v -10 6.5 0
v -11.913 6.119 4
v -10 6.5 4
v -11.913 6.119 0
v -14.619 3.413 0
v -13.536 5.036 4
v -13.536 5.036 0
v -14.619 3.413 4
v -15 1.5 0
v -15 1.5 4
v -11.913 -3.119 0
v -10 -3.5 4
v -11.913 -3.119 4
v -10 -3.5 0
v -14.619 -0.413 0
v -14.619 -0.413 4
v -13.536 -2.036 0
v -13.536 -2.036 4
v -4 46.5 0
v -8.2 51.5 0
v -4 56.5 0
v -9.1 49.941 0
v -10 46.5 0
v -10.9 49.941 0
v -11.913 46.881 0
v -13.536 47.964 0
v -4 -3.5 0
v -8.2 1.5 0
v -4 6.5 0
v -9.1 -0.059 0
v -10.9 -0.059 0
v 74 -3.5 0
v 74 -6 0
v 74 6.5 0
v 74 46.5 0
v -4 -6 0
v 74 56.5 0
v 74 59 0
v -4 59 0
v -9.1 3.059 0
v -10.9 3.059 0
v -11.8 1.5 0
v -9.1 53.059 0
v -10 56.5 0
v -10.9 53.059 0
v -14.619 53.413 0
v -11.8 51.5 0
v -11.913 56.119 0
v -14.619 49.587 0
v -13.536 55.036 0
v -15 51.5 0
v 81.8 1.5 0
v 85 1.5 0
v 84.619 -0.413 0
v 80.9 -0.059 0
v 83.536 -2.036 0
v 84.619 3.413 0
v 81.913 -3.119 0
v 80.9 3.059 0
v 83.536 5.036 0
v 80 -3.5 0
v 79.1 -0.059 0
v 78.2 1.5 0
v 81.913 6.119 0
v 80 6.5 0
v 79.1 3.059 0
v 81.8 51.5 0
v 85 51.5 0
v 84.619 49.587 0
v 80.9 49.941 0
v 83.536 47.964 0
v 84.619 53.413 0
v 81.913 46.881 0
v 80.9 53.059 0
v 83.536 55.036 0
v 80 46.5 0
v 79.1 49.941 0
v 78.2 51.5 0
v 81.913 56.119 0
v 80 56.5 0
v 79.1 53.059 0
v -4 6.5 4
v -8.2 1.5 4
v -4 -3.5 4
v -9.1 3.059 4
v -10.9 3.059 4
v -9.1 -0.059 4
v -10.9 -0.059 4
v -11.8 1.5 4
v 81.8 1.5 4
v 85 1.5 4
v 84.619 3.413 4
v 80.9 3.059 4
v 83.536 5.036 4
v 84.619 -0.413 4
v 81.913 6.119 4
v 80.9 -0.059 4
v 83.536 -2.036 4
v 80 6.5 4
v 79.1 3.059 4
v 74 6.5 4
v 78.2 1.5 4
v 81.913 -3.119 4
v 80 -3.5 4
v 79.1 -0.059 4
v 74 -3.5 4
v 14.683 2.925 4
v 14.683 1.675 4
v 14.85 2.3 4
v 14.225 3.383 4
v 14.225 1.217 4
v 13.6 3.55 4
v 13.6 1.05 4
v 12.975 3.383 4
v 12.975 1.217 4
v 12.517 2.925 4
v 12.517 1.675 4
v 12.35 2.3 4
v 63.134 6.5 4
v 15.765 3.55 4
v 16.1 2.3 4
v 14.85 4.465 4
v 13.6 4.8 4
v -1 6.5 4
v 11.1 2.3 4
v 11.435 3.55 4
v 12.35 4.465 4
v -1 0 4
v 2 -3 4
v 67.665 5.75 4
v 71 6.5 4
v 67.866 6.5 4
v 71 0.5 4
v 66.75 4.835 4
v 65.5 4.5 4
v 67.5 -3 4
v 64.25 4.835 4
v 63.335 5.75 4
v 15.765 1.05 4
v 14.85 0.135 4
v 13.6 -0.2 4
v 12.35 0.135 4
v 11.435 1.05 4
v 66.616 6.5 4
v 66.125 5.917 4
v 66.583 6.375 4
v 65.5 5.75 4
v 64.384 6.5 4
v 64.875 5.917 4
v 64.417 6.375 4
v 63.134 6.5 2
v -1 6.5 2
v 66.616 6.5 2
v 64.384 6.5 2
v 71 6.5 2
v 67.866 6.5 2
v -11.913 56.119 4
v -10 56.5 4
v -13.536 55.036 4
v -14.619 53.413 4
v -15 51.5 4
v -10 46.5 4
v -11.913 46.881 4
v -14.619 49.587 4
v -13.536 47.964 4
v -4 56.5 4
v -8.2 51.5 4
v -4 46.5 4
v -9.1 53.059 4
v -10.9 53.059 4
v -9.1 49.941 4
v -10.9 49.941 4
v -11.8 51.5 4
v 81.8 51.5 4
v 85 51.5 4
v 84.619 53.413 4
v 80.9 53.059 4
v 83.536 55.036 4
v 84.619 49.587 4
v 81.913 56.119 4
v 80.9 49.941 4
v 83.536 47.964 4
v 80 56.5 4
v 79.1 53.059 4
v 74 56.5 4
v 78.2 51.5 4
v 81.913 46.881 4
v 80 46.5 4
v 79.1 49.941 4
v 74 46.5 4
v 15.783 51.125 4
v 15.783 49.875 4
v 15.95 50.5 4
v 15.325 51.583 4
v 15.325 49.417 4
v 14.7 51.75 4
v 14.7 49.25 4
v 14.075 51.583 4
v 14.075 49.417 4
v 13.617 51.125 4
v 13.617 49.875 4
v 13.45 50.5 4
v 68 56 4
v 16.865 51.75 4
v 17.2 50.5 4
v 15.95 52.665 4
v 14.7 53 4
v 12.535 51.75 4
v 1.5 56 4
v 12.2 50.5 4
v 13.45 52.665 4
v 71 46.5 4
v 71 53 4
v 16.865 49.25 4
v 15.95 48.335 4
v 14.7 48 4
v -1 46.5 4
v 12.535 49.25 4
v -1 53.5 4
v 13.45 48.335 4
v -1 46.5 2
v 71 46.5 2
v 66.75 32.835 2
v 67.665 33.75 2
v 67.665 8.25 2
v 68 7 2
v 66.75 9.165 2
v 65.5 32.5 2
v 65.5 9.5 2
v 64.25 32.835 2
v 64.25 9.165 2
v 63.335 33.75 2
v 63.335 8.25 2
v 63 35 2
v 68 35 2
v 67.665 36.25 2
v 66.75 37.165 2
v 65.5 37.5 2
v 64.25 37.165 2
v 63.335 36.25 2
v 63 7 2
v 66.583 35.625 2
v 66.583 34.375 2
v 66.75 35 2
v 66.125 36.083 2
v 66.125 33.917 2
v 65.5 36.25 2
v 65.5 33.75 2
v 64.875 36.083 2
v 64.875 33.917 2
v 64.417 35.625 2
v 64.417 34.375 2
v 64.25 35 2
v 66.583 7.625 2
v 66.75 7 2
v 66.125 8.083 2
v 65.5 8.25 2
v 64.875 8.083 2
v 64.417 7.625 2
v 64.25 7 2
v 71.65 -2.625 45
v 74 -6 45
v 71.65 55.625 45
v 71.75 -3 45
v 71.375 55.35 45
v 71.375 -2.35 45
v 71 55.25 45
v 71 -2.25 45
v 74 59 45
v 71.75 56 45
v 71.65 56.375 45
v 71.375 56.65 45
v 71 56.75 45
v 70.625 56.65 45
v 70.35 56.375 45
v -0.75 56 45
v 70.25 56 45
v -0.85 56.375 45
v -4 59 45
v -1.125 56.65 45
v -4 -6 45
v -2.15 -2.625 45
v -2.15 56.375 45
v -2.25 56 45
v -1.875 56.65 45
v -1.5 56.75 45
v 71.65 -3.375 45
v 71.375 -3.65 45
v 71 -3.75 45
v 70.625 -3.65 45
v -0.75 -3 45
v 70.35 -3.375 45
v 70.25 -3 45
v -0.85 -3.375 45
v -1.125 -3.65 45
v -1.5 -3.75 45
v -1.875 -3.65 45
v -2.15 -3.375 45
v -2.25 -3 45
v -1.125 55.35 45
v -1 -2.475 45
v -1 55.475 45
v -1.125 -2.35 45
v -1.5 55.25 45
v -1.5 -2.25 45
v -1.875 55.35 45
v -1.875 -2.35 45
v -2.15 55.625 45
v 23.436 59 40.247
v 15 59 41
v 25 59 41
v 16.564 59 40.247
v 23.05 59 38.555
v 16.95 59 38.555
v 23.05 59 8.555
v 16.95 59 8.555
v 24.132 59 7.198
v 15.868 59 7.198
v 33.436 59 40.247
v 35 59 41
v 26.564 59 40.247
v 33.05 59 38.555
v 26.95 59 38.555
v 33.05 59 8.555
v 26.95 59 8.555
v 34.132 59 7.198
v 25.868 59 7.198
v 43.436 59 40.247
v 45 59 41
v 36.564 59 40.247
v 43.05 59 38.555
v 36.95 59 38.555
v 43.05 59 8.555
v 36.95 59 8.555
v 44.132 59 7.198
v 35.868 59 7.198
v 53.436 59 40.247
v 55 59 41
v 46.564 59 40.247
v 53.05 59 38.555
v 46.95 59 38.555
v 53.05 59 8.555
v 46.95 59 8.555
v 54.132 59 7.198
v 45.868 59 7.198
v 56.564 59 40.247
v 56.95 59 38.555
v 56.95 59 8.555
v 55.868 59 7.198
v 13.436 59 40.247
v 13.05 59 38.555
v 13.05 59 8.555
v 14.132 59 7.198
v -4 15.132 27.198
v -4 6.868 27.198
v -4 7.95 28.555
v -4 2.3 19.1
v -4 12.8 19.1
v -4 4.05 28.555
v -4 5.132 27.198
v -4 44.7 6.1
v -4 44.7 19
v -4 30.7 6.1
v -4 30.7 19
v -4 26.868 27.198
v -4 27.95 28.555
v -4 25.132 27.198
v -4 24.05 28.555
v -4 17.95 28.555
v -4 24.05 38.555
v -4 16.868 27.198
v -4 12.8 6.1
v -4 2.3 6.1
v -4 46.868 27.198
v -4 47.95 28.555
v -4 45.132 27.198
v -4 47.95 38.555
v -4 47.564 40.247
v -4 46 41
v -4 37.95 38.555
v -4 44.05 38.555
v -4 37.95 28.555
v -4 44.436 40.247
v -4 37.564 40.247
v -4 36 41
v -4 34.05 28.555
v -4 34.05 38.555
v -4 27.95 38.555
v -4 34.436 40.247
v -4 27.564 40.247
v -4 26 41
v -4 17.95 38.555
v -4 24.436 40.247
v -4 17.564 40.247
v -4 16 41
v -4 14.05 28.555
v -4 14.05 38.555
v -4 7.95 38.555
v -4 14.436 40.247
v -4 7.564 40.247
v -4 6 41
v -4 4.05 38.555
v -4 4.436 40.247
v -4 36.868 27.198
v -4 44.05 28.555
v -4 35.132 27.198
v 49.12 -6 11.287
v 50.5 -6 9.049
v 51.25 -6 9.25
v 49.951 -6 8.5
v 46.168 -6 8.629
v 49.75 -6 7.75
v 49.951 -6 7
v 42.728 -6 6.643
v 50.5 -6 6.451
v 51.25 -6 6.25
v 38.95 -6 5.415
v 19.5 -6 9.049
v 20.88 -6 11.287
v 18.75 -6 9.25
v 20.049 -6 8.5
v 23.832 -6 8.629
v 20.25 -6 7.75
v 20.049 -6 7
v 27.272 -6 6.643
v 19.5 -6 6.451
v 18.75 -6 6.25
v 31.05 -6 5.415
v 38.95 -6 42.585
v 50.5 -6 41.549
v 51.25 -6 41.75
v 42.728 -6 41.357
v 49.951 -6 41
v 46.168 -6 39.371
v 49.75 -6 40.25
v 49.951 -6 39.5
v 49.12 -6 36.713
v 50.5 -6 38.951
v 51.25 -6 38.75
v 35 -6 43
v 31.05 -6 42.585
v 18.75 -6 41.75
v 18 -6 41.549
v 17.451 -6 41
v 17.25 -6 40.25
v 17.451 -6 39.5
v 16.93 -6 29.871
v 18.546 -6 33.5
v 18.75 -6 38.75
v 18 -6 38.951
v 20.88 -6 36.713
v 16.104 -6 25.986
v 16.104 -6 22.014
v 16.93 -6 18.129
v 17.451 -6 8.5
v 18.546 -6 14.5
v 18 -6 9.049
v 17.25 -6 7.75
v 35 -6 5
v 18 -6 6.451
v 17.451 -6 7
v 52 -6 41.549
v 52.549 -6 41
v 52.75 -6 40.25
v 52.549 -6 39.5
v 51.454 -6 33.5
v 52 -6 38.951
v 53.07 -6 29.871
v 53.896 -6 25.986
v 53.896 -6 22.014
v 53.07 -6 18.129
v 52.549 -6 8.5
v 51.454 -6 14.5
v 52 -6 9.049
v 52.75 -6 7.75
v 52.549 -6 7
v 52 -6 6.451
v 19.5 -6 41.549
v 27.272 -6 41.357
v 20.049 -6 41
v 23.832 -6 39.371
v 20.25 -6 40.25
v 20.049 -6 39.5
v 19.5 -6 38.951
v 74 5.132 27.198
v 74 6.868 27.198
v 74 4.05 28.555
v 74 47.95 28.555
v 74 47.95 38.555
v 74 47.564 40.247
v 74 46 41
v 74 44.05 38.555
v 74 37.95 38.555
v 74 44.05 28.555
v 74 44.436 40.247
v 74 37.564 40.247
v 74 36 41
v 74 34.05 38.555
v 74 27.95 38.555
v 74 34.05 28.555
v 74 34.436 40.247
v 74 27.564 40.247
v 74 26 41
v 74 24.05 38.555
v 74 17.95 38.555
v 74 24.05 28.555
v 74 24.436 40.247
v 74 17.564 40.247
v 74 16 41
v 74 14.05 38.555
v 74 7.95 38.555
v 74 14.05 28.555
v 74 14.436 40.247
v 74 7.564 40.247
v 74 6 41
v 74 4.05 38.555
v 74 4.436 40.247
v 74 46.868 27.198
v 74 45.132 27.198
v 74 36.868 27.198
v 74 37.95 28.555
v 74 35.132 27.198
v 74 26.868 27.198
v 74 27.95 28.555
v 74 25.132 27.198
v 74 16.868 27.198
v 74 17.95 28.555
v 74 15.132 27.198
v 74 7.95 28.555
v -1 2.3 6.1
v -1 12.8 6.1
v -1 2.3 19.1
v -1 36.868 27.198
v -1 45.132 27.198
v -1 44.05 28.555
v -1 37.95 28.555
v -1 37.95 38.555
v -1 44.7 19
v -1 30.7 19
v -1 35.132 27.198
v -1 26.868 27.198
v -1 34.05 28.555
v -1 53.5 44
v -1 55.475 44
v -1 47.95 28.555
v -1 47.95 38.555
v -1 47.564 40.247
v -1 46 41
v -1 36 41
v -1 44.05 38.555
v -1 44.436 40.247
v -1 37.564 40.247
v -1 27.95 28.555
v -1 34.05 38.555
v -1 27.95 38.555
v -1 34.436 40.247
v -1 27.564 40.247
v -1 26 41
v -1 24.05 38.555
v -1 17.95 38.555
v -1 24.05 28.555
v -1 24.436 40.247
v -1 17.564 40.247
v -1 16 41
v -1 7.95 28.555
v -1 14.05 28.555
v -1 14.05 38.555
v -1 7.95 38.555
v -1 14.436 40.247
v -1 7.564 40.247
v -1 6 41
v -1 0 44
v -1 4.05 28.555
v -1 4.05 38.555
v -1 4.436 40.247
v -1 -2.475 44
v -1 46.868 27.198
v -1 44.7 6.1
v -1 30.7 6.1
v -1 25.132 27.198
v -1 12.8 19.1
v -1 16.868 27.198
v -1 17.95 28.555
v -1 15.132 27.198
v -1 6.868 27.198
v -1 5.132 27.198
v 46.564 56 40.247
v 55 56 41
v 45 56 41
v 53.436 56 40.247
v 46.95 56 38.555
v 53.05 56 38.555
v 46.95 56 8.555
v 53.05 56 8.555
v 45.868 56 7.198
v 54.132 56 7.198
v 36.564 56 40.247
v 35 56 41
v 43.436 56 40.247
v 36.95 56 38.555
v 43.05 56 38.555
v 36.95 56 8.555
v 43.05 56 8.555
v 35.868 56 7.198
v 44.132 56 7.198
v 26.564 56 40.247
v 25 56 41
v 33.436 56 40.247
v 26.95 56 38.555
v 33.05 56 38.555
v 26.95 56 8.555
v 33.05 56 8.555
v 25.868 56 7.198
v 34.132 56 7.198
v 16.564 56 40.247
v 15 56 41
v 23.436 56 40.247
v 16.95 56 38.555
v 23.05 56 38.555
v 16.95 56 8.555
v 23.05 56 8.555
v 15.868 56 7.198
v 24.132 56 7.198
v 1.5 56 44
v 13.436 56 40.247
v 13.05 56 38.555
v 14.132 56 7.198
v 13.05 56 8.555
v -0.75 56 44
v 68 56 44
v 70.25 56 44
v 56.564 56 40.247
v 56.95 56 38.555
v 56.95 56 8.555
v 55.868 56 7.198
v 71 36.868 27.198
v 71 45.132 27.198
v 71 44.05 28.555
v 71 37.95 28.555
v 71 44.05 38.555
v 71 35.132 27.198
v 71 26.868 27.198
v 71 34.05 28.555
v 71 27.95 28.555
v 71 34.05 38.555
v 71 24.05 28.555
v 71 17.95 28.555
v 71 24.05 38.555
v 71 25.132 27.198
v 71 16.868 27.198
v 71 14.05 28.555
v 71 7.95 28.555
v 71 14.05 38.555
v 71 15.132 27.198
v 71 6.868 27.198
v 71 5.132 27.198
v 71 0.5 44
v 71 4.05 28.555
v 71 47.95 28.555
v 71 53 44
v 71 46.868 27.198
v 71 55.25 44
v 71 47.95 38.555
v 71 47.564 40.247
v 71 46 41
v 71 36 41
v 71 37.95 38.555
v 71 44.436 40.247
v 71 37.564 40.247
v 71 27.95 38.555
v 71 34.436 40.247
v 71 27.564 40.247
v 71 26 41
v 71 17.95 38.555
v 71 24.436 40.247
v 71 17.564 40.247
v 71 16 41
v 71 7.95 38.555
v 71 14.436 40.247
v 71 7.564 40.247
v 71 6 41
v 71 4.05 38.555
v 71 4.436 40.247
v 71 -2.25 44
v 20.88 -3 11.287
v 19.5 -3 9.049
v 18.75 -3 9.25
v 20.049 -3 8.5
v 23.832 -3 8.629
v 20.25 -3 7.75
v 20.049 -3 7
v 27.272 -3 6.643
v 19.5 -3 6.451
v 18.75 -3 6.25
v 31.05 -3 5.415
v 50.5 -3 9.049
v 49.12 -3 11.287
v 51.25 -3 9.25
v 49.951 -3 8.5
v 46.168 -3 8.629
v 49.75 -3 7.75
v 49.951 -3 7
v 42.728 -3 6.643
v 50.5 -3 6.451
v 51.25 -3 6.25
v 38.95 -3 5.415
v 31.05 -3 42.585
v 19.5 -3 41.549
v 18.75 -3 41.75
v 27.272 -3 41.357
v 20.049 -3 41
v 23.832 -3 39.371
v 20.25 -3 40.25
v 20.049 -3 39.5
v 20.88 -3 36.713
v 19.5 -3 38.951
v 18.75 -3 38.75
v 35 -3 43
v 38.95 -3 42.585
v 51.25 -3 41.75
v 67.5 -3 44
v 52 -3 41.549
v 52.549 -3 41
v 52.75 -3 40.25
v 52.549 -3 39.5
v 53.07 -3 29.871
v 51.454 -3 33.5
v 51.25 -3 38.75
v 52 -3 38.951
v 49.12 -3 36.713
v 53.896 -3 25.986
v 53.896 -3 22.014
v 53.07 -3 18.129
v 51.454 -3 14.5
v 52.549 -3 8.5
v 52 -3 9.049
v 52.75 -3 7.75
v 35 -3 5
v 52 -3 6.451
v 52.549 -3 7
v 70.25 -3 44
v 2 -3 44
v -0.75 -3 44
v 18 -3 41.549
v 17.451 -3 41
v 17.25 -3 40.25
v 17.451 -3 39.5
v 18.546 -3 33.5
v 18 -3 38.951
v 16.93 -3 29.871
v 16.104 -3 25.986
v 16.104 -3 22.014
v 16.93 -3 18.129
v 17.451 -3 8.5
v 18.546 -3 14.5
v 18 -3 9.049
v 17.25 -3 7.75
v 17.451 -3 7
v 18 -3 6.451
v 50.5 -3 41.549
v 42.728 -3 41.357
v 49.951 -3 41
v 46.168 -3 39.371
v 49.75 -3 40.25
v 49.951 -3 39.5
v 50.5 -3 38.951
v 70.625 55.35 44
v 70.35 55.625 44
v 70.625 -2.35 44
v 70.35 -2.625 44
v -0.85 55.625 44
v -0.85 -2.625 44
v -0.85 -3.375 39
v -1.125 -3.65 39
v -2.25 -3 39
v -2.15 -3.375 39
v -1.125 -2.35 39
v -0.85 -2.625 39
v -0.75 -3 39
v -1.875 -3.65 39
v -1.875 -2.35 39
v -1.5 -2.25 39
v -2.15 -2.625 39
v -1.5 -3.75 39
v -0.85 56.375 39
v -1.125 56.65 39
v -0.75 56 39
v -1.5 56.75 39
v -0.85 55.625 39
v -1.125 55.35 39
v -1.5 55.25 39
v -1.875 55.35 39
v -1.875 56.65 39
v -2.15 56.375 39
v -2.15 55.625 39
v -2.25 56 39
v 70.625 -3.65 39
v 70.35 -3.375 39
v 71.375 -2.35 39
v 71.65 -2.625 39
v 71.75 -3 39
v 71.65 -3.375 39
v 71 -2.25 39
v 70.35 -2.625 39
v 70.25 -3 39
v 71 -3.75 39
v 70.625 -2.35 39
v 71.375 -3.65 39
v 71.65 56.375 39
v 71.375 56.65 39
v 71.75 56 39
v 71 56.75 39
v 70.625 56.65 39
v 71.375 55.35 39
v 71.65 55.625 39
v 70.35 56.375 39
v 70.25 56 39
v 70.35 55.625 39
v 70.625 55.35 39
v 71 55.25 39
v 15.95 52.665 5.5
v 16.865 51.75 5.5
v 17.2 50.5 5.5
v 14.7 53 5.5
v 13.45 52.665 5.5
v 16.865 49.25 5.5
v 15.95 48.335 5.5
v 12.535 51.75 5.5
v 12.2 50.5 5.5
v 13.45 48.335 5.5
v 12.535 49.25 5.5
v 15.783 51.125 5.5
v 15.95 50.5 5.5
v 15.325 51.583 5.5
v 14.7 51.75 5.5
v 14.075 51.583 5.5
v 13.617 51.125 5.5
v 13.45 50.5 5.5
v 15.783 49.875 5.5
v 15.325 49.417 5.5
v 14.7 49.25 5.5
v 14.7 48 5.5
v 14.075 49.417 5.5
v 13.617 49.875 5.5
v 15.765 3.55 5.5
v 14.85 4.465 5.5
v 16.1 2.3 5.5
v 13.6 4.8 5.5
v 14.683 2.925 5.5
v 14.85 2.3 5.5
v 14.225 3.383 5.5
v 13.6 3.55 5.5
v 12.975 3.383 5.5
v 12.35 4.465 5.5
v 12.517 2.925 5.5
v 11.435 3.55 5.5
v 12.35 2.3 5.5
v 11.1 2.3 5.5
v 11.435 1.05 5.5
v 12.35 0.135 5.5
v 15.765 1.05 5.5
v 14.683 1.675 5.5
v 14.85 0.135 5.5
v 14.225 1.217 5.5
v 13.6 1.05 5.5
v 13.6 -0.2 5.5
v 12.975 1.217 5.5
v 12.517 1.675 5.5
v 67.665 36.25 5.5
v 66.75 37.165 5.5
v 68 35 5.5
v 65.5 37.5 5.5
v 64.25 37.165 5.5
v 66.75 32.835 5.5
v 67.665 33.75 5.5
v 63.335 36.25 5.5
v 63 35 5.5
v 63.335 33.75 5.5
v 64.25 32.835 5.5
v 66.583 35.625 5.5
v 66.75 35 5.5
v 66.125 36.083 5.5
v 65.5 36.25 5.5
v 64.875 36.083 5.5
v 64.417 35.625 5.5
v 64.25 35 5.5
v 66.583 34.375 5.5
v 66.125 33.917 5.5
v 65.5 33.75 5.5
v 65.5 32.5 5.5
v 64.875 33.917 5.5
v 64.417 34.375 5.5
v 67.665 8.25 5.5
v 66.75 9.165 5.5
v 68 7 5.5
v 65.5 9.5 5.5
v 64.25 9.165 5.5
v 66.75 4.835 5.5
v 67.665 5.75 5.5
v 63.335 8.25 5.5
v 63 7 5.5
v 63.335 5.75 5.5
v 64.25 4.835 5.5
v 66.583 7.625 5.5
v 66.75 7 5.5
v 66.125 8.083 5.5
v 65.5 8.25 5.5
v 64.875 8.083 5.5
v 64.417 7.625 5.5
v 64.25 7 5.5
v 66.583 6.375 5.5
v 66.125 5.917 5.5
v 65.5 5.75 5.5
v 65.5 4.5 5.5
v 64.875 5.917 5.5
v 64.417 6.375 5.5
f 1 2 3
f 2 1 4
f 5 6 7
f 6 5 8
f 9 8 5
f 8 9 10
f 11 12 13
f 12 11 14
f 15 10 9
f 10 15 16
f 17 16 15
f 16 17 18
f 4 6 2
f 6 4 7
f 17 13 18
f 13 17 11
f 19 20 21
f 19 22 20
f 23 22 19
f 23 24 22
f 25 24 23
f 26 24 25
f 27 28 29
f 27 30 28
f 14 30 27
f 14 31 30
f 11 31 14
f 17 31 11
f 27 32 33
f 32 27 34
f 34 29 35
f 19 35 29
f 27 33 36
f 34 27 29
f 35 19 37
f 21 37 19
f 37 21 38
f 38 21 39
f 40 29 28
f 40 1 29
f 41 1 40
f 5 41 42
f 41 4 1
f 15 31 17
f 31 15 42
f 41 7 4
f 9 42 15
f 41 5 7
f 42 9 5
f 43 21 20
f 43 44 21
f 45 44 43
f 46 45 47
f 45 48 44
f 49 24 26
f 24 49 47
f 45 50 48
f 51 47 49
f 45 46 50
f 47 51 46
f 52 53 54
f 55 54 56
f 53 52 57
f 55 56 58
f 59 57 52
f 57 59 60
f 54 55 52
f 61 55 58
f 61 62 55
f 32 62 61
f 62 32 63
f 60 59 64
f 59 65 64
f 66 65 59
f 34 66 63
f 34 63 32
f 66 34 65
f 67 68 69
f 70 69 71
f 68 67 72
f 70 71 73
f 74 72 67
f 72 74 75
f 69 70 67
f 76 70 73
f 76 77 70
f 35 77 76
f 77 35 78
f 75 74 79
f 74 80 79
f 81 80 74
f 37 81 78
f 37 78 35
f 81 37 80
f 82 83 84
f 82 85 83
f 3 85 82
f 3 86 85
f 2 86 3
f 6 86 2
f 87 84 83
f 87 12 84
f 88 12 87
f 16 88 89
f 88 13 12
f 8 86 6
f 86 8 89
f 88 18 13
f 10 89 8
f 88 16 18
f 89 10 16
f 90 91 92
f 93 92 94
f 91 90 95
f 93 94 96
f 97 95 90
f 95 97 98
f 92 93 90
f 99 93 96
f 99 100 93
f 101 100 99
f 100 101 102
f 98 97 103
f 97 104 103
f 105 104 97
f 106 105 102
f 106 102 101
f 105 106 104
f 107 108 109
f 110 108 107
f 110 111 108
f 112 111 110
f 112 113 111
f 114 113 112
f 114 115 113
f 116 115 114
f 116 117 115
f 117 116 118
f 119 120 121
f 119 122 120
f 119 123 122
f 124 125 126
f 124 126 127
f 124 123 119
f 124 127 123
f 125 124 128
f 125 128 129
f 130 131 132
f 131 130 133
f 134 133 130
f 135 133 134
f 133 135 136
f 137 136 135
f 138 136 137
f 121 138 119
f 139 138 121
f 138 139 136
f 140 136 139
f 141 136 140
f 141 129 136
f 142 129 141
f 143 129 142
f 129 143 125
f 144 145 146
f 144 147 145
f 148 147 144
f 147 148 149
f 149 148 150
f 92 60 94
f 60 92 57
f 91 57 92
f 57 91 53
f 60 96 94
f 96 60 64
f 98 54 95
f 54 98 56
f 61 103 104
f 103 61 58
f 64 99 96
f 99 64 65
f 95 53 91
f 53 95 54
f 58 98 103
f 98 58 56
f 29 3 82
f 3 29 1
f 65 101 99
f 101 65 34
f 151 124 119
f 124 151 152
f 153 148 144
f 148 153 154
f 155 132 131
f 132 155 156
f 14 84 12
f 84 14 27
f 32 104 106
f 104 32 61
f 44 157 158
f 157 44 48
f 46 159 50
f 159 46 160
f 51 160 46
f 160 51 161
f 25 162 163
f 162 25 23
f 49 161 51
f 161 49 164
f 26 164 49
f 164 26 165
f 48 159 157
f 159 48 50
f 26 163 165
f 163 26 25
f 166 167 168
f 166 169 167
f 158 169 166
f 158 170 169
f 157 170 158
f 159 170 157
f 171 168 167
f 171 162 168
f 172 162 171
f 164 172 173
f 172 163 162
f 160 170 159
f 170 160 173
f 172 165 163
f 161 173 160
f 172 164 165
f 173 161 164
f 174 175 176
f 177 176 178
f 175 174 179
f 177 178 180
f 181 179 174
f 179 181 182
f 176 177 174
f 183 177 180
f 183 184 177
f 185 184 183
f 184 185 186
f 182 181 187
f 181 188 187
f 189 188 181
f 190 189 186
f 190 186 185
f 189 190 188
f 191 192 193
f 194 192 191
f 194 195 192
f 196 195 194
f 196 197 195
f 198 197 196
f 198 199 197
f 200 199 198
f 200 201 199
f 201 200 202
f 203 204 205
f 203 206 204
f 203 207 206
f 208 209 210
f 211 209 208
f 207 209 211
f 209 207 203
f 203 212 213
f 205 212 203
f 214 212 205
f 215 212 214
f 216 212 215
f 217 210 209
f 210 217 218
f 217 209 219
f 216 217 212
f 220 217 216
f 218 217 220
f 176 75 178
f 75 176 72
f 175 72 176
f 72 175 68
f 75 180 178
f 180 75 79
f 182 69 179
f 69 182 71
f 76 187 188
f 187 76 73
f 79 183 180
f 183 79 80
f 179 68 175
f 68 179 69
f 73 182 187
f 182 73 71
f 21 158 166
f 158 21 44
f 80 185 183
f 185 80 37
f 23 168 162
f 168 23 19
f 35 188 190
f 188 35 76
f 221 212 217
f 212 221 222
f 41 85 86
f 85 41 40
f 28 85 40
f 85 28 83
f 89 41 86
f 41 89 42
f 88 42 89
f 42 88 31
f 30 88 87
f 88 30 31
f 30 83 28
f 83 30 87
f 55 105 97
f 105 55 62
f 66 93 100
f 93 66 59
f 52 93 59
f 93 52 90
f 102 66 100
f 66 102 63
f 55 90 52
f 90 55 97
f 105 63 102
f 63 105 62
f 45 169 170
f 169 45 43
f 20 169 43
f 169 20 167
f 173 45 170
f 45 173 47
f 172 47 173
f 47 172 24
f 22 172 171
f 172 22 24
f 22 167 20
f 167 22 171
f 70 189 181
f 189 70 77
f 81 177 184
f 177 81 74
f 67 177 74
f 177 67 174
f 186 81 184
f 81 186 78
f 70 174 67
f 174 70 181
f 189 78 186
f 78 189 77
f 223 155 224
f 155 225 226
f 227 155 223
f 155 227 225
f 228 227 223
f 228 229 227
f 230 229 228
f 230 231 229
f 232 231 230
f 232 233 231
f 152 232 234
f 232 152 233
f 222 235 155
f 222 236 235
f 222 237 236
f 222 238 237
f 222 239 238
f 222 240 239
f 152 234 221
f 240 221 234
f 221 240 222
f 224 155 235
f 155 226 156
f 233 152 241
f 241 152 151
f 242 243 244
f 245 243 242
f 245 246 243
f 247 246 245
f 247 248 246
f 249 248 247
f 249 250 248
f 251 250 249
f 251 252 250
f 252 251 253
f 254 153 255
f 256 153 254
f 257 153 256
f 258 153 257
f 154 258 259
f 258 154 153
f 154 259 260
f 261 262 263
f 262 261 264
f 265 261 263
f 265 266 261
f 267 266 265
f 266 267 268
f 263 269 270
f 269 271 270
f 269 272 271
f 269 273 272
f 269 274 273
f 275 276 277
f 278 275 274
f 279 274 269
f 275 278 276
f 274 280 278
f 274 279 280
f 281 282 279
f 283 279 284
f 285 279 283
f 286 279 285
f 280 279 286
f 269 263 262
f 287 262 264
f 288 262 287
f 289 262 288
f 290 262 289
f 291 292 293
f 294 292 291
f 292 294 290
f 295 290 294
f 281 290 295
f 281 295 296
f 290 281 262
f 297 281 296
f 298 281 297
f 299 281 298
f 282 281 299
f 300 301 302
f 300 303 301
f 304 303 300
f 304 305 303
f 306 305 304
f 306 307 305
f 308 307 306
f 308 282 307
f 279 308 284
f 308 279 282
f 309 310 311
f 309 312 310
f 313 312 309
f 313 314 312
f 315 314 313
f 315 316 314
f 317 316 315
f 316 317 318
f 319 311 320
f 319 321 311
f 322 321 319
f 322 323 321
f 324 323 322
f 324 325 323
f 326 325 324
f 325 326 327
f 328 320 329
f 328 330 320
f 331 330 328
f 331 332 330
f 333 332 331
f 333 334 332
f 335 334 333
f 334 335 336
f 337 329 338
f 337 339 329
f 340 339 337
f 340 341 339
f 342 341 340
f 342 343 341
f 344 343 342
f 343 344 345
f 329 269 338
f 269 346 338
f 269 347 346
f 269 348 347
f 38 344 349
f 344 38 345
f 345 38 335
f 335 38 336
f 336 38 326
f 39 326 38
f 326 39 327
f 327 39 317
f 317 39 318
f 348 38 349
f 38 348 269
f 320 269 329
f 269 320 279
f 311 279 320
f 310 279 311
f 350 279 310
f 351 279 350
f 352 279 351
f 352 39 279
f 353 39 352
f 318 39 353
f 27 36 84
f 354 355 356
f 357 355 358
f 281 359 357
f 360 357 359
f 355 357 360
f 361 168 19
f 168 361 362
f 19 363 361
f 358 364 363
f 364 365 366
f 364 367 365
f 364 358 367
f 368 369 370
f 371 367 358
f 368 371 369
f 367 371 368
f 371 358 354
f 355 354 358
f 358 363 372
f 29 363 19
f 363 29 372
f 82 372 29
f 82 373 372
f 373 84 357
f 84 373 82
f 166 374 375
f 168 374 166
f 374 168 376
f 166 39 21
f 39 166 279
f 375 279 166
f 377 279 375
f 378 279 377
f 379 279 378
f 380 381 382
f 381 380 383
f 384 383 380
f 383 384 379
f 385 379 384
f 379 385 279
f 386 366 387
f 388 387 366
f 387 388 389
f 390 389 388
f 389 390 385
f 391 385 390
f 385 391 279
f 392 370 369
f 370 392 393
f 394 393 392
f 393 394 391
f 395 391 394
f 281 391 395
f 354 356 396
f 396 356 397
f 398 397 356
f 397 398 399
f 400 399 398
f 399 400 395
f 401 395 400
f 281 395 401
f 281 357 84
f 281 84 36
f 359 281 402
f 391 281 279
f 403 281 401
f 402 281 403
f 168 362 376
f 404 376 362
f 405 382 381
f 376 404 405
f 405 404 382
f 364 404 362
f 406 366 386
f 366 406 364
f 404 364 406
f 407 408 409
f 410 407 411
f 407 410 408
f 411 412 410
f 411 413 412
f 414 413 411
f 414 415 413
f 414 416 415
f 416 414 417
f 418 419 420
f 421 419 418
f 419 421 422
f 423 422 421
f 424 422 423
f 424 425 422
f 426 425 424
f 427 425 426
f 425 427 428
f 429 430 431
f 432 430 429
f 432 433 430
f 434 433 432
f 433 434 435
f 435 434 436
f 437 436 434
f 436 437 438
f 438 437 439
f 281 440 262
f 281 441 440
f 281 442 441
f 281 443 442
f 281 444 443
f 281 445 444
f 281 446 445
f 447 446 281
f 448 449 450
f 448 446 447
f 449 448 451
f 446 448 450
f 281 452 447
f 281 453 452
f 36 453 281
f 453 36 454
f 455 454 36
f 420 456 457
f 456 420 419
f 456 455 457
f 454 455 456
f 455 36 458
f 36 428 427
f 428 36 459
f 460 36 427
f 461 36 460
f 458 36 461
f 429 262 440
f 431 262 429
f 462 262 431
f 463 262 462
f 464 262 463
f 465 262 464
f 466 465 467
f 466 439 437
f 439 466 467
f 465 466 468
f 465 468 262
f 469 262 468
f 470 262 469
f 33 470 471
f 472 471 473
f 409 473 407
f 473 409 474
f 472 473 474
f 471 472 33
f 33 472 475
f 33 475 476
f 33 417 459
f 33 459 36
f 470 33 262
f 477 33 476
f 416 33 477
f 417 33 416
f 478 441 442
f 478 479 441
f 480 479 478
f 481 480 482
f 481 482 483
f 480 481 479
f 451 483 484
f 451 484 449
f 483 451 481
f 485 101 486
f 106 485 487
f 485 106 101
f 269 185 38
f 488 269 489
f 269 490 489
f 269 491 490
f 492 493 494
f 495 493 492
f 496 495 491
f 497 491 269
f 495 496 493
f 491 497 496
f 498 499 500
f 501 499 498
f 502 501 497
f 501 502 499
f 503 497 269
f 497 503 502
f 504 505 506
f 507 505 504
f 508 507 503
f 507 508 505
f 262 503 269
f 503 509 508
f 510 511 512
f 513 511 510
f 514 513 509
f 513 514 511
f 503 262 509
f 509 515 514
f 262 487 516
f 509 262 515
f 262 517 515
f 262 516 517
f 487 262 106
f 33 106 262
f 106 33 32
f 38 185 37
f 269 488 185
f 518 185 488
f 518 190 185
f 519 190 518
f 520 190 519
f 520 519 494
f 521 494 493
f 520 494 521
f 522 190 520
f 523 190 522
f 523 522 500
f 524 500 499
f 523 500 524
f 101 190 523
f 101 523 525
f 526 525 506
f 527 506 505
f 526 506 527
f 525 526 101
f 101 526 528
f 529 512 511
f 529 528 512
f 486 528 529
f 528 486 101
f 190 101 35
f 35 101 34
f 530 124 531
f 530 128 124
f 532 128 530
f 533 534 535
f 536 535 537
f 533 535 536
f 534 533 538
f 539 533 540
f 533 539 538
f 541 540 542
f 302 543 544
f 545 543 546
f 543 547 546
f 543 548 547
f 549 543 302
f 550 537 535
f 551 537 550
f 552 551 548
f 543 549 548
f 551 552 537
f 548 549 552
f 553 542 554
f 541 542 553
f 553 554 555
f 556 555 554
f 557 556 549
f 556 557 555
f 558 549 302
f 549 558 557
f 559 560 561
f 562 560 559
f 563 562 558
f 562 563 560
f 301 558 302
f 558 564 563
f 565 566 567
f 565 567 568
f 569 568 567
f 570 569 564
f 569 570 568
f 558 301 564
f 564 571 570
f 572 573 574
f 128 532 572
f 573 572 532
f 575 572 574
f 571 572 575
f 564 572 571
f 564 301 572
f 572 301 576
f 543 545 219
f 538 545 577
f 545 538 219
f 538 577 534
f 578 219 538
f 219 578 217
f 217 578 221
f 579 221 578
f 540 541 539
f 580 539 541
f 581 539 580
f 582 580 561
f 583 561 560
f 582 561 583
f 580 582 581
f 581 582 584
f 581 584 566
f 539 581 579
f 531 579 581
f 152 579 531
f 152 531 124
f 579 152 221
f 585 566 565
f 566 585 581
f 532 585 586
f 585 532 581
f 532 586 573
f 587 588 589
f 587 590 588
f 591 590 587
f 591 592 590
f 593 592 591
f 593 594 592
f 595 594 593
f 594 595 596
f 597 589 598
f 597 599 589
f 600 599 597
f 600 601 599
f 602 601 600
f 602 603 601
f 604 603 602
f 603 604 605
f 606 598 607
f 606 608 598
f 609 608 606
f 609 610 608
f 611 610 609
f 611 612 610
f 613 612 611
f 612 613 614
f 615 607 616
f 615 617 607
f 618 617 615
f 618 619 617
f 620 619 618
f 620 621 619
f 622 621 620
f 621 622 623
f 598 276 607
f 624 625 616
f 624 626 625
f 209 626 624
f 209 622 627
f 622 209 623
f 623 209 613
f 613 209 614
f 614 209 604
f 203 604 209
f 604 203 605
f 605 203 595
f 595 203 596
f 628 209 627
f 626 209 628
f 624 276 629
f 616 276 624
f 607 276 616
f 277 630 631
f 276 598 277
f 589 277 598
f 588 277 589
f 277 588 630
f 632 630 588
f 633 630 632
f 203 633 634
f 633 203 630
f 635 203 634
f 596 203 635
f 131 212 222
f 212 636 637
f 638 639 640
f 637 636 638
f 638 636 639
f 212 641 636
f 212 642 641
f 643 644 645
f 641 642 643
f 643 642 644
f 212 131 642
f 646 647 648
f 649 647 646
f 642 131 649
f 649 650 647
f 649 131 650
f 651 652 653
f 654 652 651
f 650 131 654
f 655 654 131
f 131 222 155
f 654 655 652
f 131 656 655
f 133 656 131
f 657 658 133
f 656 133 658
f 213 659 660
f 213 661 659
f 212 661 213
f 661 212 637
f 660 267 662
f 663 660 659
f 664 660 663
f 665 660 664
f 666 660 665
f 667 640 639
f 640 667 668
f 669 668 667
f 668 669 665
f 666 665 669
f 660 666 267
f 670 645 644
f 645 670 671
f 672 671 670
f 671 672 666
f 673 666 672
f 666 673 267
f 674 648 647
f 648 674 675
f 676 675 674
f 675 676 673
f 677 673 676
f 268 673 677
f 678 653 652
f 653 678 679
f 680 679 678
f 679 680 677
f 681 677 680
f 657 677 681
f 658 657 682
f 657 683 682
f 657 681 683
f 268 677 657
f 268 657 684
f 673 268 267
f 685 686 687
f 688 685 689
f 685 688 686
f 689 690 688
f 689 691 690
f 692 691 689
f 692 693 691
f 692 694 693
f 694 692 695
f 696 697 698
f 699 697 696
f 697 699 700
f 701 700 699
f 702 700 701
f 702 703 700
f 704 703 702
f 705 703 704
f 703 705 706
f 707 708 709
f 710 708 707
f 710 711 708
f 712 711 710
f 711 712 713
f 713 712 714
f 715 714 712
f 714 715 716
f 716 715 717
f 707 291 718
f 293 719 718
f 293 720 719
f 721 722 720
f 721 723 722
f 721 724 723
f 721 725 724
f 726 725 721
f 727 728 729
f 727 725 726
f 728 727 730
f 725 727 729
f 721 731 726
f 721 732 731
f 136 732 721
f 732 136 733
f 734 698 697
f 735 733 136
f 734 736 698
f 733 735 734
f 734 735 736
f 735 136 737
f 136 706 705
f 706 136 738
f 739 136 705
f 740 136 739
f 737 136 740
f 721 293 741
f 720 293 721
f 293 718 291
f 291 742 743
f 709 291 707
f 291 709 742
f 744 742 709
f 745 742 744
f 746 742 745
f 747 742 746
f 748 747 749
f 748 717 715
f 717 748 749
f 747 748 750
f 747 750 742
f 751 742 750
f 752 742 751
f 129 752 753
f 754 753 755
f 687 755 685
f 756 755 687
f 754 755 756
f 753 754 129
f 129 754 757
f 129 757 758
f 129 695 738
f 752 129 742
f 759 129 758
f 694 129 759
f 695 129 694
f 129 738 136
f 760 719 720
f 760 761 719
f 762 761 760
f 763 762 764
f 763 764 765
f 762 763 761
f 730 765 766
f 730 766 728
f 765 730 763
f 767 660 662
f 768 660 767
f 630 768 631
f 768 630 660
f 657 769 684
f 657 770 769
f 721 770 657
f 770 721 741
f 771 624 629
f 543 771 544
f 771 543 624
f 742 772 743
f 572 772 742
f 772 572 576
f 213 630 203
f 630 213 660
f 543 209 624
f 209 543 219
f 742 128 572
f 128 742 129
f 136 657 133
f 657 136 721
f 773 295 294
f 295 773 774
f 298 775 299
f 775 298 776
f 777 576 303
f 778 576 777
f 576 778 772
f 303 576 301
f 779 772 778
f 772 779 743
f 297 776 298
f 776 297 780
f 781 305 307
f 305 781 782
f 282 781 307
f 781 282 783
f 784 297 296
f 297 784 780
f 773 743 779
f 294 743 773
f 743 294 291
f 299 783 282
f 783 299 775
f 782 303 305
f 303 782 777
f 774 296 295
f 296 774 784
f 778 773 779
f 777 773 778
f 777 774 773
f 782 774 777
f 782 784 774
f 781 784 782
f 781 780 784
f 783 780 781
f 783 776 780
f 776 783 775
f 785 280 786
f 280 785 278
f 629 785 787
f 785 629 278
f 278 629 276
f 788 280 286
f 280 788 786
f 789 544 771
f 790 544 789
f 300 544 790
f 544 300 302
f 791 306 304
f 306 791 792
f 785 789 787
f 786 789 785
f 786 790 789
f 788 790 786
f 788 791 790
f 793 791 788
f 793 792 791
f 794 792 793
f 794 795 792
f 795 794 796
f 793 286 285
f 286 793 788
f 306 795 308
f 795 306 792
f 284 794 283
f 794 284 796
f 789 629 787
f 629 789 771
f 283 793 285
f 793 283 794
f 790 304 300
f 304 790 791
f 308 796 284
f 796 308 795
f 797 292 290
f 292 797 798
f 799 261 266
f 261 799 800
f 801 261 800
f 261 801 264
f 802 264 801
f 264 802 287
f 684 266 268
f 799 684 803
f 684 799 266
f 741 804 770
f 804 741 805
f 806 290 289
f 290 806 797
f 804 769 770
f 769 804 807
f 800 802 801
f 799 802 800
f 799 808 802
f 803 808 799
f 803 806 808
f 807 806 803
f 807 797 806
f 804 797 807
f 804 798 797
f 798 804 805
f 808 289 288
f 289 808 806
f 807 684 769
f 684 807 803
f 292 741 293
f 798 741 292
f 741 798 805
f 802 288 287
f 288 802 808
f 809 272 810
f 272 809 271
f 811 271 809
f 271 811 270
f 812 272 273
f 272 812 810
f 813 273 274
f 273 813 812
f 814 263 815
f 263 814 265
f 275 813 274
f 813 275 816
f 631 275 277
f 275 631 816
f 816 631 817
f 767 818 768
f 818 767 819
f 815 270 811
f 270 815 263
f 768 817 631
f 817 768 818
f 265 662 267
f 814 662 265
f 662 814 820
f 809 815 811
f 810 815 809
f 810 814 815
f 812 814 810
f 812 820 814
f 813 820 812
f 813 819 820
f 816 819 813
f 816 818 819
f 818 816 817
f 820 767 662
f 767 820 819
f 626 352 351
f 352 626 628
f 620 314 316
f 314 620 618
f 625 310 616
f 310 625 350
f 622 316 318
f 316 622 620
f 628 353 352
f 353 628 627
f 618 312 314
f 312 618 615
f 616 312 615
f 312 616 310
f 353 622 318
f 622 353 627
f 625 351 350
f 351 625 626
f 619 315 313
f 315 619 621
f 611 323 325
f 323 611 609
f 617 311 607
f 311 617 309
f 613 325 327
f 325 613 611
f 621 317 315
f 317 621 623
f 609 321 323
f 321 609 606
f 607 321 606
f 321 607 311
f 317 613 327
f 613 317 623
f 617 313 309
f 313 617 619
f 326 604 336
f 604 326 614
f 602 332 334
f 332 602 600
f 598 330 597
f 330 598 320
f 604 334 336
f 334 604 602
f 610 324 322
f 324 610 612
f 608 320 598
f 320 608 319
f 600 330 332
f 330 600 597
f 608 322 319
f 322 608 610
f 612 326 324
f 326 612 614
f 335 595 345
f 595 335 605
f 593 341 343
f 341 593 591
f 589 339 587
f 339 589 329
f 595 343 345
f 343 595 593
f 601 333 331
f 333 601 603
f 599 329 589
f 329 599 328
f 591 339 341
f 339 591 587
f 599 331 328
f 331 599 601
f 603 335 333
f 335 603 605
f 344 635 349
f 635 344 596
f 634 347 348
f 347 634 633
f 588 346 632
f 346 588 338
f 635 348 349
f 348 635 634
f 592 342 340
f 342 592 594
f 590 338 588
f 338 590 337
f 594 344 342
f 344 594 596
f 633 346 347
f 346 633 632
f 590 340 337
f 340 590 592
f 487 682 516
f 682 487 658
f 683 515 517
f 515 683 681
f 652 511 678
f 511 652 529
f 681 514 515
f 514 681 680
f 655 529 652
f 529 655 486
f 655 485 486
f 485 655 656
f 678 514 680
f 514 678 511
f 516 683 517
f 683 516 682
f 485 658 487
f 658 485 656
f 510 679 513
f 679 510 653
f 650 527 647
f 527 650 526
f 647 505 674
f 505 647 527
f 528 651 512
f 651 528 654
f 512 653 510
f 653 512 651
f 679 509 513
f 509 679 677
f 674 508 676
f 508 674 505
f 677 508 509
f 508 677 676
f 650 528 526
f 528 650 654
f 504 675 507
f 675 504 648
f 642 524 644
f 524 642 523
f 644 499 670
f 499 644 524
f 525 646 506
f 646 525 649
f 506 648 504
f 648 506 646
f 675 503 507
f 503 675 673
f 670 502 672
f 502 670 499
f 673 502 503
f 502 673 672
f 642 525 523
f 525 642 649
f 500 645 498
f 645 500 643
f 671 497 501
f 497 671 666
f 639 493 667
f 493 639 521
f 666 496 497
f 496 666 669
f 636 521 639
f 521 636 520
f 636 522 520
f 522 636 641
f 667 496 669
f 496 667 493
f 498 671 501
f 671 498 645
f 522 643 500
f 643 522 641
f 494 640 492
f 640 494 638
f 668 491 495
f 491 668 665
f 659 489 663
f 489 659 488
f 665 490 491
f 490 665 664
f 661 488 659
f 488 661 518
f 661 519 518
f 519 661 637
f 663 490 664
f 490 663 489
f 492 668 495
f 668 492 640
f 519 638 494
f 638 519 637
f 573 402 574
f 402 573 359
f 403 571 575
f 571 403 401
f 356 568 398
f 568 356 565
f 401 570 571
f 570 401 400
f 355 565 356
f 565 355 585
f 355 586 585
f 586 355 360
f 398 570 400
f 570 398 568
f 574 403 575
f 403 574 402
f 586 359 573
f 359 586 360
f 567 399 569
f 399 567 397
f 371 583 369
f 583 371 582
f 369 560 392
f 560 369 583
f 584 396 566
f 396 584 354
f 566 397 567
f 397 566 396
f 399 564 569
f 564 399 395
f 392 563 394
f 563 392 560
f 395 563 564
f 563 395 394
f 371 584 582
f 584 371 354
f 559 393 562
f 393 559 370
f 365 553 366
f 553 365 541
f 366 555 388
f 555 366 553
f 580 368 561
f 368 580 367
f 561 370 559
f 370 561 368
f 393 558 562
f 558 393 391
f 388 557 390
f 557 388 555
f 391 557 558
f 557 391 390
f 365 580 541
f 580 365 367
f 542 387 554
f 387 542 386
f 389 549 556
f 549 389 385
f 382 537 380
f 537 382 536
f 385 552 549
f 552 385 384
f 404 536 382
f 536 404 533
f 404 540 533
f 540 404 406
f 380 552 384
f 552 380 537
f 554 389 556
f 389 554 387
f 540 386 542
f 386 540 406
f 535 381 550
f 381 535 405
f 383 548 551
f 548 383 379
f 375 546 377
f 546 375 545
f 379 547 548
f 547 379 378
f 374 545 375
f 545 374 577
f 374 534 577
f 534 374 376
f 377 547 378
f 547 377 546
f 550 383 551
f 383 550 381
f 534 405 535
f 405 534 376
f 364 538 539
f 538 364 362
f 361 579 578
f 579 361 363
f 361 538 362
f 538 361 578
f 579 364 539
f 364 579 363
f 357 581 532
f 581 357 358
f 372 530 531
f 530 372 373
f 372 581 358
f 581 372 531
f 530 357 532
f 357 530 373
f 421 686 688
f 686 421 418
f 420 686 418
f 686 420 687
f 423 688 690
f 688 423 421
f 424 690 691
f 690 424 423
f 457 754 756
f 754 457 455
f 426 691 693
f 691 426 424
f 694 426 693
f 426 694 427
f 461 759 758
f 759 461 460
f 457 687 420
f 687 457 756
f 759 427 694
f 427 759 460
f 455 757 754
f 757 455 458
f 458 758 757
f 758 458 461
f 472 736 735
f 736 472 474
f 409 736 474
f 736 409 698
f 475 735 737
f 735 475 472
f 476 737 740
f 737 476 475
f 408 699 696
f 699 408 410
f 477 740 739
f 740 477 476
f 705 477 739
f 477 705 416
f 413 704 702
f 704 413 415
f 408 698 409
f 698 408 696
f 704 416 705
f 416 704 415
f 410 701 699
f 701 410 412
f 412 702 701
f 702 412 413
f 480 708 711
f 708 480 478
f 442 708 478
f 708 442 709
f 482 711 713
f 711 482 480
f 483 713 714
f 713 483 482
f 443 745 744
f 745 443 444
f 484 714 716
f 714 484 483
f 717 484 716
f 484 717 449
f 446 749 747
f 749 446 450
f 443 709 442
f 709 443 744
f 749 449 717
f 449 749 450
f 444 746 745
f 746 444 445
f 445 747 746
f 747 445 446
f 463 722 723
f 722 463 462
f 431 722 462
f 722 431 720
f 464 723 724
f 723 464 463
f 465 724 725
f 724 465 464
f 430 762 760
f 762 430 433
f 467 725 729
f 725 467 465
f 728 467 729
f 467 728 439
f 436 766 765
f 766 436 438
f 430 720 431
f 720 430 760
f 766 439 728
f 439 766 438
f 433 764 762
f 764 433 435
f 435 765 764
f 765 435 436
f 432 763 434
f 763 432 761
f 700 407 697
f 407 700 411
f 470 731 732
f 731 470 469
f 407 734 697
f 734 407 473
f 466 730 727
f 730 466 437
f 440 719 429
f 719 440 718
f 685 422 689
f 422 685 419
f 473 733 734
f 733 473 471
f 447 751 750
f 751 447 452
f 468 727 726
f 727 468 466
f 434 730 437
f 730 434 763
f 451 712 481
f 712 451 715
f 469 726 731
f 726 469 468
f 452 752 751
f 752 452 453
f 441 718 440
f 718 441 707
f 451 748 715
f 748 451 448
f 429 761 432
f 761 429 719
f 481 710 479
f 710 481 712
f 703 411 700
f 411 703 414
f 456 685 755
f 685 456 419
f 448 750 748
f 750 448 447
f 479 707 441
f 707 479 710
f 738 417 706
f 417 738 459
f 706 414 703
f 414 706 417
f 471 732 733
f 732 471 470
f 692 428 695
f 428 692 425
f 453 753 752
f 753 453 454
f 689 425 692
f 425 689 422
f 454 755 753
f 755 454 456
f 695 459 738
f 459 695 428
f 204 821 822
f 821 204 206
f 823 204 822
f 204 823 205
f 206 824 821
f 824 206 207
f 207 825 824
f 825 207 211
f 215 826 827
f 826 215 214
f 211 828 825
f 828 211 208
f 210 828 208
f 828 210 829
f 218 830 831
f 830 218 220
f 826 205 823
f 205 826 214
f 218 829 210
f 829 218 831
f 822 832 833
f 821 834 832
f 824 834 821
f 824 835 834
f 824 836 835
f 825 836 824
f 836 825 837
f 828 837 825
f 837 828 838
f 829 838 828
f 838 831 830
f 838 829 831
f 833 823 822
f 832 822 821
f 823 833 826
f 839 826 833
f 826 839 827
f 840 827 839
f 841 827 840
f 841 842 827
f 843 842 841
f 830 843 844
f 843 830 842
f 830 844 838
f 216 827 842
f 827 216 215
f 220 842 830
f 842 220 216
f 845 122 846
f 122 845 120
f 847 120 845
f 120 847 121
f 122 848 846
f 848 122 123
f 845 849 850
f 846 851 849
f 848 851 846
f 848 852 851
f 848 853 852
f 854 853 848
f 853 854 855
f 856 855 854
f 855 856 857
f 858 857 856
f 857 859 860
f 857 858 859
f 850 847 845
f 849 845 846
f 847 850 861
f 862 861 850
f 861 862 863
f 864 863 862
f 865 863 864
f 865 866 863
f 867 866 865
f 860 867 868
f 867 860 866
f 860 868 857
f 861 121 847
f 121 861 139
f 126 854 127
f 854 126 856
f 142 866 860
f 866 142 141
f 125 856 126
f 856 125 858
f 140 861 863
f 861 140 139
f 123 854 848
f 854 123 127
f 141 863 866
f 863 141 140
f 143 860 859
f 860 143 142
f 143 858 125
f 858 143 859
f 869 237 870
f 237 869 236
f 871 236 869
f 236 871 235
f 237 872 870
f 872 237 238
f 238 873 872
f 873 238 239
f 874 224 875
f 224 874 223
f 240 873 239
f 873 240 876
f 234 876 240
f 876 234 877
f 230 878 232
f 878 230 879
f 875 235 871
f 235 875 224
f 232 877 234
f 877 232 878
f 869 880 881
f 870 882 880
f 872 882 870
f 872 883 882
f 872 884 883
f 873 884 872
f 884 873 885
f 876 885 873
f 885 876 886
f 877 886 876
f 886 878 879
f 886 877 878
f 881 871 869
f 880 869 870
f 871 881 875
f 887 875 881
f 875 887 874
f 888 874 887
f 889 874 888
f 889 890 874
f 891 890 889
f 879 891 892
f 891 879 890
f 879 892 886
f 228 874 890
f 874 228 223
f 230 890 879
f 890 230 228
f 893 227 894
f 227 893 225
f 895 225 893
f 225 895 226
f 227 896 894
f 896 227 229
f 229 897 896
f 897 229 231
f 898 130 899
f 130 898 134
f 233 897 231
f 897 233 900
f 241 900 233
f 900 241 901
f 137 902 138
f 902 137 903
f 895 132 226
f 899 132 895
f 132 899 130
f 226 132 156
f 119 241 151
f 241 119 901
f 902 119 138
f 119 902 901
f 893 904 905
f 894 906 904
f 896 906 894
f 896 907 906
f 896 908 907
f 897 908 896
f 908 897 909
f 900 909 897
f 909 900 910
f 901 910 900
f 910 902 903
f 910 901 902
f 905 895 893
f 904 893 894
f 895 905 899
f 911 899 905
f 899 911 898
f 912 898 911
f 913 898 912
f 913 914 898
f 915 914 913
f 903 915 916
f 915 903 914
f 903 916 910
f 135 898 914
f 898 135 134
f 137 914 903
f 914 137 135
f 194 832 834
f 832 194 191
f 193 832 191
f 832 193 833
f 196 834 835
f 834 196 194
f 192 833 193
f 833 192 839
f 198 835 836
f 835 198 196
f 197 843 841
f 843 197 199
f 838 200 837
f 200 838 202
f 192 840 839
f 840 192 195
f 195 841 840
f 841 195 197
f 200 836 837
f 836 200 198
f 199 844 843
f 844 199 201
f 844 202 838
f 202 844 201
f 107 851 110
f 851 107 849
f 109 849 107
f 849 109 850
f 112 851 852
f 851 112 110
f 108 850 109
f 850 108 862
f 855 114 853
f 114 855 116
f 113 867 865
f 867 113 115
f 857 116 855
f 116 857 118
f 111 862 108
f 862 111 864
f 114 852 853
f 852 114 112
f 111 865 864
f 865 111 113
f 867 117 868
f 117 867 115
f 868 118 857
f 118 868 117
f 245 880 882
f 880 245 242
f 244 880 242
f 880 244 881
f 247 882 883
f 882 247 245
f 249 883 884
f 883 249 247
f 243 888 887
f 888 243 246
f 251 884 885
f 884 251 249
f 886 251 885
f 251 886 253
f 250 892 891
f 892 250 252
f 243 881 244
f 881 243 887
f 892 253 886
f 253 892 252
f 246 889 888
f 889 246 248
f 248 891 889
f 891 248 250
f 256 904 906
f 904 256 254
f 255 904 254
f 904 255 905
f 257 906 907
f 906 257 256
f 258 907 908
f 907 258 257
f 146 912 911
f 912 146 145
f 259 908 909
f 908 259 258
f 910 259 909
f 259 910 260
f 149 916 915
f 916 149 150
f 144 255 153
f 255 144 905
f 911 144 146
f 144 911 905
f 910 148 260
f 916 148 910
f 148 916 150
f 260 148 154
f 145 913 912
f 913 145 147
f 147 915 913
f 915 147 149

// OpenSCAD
module uno_pcb(h = 1.7)
{
    difference()
    {
        linear_extrude(h) polygon([[0,0],[66,0],[66,2],[68.6,5],[68.6,37],[66,40],[66,53.3],[0,53.3]]);
        translate([14.7, 50.5, -1]) cylinder(d = 3.2, h = h + 2, $fn = 12);
        translate([13.6, 2.3, -1]) cylinder(d = 3.2, h =  h + 2, $fn = 12);
        translate([65.5, 35, -1]) cylinder(d = 3.2, h =  h + 2, $fn = 12);
        translate([65.5, 7, -1]) cylinder(d = 3.2, h =  h + 2, $fn = 12);
    }
}

module header(r,c, h = 8.6)
    color("black") cube([2.54 * c, 2.54 * r, h]);

module uno()
{
    color("royalblue") translate([0, 0, 1.4]) uno_pcb();
    color("lightgray") translate([2, 5, 0]) cube([60, 42, 2]);
    
    color("lightgray") translate([-6.2, 31.7, 3.1]) cube([16.5, 12, 10.9]);
    color("darkslategray") translate([-1.8, 3.3, 3.1]) cube([14.5, 8.5, 11]);
    
    color("royalblue")  translate([18, 10, 3.1]) cube([42, 35, 6]);
           
    translate([25.65, 2.54, 3.1]) header(1, 8);
    translate([48.53, 2.54, 3.1]) header(1, 6);
    translate([17.05, 50.5, 3.1]) header(1, 10);
    translate([43.45, 50.5, 3.1]) header(1, 8);
}

module uno_shield()
{
    color("red") uno_pcb();
    translate([25.65, 2.54, -2.2]) header(1, 8, 2.3);
    translate([48.53, 2.54, -2.2]) header(1, 6, 2.3);
    translate([17.05, 50.5, -2.2]) header(1, 10, 2.3);
    translate([43.45, 50.5, -2.2]) header(1, 8, 2.3);
    
    color("yellow")  translate([18, 4, 1.7]) cube([36, 45, 15]);
    
    color("white")  translate([56, 6, 1.7]) cube([11, 30, 9]);
    color("white")  translate([56, 35, 1.7]) cube([7, 14, 9]);
    
    color("royalblue")  translate([1, 10, 1.7]) cube([15, 41, 10]);
}

module uno_simple()
    color("DarkSlateGray") uno();

module fan(h = 10.4)
{
    difference()
    {
        linear_extrude(height = h) minkowski()
        {
            translate([2.5, 2.5, 0]) square([35, 35]);
            circle(d = 5);
        }
        for (i = [0, 32.5], j = [0, 32.5])
        {
            translate([7.5/2 + i, 7.5/2 + j, -5]) {
              cylinder(d = 3, h = h + 10, $fn = 12);
            }
            //translate([7.5/2 + i, 7.5/2 + j, 10.4 - 3.25]) cylinder(d = 5.5, h = 20, $fn = 12);
        }
    }

}


//%color("white", 0.3) uno();
//%color("white", 0.3) translate([0, 0, 14]) uno_shield();

//translate([15, 65, 0]) rotate([0, -90, -90]) fan();

module enclosure()
{
// external feet
    translate([-10, -3.5, -4]) {
      difference()
      {
        union() {
          for(y=[0, 50]) {
            translate([0, y, 0]) {
              cube([90, 10, 4]);
              for(x=[0, 90]) {
                translate([x, 5, 0]) {
                  cylinder(d=10, h=4);
                }
              }
            }
          }
        }
        for(y=[0, 50]) {
          translate([0, y, 0]) {
            for(x=[0, 90]) {
              translate([x, 5, 0]) {
                cylinder(d=3.6, h=4);
              }
            }
          }
        }
      }
/*
        translate([0, 0, -4]) {
          linear_extrude(height = 4) {
            for (i = [-6, 74], j = [-11, 64]) {
              hull() {
                translate([35, 25]) circle(d = 25);
                translate([i, j]) circle(d = 10);
              }
            }
          }
        }
        translate([-4, -5, -2]) cube([77, 63, 4]);
        translate([0, 0, -5]) for (i = [-6, 74], j = [-11, 64]) 
        {
            translate([i, j]) cylinder(d = 2.5, h = 5, $fn = 12);
        }
        translate([0, 0, -2]) for (i = [-6, 74], j = [-11, 64]) 
        {
            translate([i, j]) cylinder(d = 5.5, h = 5, $fn = 12);
        }
*/
    }
    
    translate([-4, -6, -4]) cube([78, 65, 2]);
    
    difference()
    {
        union()
        {
            translate([0, 0, -2]) linear_extrude(height = 43) difference()
            {
                translate([-4, -6]) square([78, 65]);
                translate([-1, -3]) square([72, 59]);
            }
            translate([0, 0, -2]) linear_extrude(height = 42) 
            {
                translate([-2.5, -3.5]) polygon([[0, 0], [0, 5], [5, 0]]);
                translate([72, 57]) rotate([0, 0, 180]) polygon([[0, 0], [0, 5], [5, 0]]);
                translate([-2.5, 57]) rotate([0, 0, -90]) polygon([[0, 0], [0, 5], [5, 0]]);
                translate([72, -3.5]) rotate([0, 0, 90]) polygon([[0, 0], [0, 5], [5, 0]]);
            }
        }
        
        for (i = [-1.5, 71], j = [-3, 56]) translate([i, j, 35]) cylinder(d = 1.5, h = 10, $fn = 12);
        
        translate([-6.2, 30.7, 2.1]) cube([16.5, 14, 12.9]);
        translate([-5, 2.3, 2.1]) cube([14.5, 10.5, 13]);
        
        translate([35, -5, 20]) rotate([0, -90, -90]) cube([38, 38, 10], center = true);
        
// holes
        for (i = [-2, -1, 0, 1, 2]) hull()
        {
            translate([35 + 10*i, 55, 5]) rotate([0, -90, -90]) cylinder(d = 4, h = 10, center = true);
            translate([35 + 10*i, 55, 35]) rotate([0, -90, -90]) cylinder(d = 4, h = 10, center = true);
        }
        
        for (i = [-2, -1, 0, 1, 2]) hull()
        {
            translate([75, 26 + 10*i, 25]) rotate([0, -90, 0]) cylinder(d = 4, h = 10, center = true);
            translate([75, 26 + 10*i, 35]) rotate([0, -90, 0]) cylinder(d = 4, h = 10, center = true);
        }
        
        for (i = [-2, -1, 0, 1, 2]) hull()
        {
            translate([0, 26 + 10*i, 25]) rotate([0, -90, 0]) cylinder(d = 4, h = 10, center = true);
            translate([0, 26 + 10*i, 35]) rotate([0, -90, 0]) cylinder(d = 4, h = 10, center = true);
        }
    }
    
// fan
    difference()
    {
        translate([15, -6, 0]) rotate([0, -90, -90]) fan(h = 3);
// fan hole
        translate([35, -10, 20]) rotate([0, -90, -90]) cylinder(d = 38, h = 30);
    }

// internal uno feet
    difference(){
        union()
        {
            translate([14.7, 50.5, -2]) cylinder(d = 5, h = 3.5, $fn = 12);
            translate([13.6, 2.3, -2]) cylinder(d = 5, h =  3.5, $fn = 12);
            translate([65.5, 35, -2]) cylinder(d = 5, h =  3.5, $fn = 12);
            translate([65.5, 7, -2]) cylinder(d = 5, h =  3.5, $fn = 12);
        }
        union()
        {
            translate([14.7, 50.5, -3]) cylinder(d = 2.5, h = 4.5, $fn = 12);
            translate([13.6, 2.3, -3]) cylinder(d = 2.5, h =  4.5, $fn = 12);
            translate([65.5, 35, -3]) cylinder(d = 2.5, h =  4.5, $fn = 12);
            translate([65.5, 7, -3]) cylinder(d = 2.5, h =  4.5, $fn = 12);
        }
    }
}

module top() 
{
    translate([100, 0, -2]) difference()
    {
        union()
        {
            translate([-1 + 0.2, -3 + 0.2, 4]) cube([72 - 0.4, 59 - 0.4, 1]);
            translate([-4, -6, 2]) cube([78, 65, 2]);
        }
        for (i = [-1.5, 71], j = [-3, 56]) translate([i, j, -1]) cylinder(d = 2.5, h = 10, $fn = 12);
        
        for (i = [-2, -1, 0, 1, 2]) hull()
        {
            translate([35 + 10*i, 6, 5]) rotate([0, 0, -90]) cylinder(d = 4, h = 10, center = true);
            translate([35 + 10*i, 47, 5]) rotate([0, 0, -90]) cylinder(d = 4, h = 10, center = true);
        }
    }
}

translate([0, 0, 4]) enclosure();

//top();
